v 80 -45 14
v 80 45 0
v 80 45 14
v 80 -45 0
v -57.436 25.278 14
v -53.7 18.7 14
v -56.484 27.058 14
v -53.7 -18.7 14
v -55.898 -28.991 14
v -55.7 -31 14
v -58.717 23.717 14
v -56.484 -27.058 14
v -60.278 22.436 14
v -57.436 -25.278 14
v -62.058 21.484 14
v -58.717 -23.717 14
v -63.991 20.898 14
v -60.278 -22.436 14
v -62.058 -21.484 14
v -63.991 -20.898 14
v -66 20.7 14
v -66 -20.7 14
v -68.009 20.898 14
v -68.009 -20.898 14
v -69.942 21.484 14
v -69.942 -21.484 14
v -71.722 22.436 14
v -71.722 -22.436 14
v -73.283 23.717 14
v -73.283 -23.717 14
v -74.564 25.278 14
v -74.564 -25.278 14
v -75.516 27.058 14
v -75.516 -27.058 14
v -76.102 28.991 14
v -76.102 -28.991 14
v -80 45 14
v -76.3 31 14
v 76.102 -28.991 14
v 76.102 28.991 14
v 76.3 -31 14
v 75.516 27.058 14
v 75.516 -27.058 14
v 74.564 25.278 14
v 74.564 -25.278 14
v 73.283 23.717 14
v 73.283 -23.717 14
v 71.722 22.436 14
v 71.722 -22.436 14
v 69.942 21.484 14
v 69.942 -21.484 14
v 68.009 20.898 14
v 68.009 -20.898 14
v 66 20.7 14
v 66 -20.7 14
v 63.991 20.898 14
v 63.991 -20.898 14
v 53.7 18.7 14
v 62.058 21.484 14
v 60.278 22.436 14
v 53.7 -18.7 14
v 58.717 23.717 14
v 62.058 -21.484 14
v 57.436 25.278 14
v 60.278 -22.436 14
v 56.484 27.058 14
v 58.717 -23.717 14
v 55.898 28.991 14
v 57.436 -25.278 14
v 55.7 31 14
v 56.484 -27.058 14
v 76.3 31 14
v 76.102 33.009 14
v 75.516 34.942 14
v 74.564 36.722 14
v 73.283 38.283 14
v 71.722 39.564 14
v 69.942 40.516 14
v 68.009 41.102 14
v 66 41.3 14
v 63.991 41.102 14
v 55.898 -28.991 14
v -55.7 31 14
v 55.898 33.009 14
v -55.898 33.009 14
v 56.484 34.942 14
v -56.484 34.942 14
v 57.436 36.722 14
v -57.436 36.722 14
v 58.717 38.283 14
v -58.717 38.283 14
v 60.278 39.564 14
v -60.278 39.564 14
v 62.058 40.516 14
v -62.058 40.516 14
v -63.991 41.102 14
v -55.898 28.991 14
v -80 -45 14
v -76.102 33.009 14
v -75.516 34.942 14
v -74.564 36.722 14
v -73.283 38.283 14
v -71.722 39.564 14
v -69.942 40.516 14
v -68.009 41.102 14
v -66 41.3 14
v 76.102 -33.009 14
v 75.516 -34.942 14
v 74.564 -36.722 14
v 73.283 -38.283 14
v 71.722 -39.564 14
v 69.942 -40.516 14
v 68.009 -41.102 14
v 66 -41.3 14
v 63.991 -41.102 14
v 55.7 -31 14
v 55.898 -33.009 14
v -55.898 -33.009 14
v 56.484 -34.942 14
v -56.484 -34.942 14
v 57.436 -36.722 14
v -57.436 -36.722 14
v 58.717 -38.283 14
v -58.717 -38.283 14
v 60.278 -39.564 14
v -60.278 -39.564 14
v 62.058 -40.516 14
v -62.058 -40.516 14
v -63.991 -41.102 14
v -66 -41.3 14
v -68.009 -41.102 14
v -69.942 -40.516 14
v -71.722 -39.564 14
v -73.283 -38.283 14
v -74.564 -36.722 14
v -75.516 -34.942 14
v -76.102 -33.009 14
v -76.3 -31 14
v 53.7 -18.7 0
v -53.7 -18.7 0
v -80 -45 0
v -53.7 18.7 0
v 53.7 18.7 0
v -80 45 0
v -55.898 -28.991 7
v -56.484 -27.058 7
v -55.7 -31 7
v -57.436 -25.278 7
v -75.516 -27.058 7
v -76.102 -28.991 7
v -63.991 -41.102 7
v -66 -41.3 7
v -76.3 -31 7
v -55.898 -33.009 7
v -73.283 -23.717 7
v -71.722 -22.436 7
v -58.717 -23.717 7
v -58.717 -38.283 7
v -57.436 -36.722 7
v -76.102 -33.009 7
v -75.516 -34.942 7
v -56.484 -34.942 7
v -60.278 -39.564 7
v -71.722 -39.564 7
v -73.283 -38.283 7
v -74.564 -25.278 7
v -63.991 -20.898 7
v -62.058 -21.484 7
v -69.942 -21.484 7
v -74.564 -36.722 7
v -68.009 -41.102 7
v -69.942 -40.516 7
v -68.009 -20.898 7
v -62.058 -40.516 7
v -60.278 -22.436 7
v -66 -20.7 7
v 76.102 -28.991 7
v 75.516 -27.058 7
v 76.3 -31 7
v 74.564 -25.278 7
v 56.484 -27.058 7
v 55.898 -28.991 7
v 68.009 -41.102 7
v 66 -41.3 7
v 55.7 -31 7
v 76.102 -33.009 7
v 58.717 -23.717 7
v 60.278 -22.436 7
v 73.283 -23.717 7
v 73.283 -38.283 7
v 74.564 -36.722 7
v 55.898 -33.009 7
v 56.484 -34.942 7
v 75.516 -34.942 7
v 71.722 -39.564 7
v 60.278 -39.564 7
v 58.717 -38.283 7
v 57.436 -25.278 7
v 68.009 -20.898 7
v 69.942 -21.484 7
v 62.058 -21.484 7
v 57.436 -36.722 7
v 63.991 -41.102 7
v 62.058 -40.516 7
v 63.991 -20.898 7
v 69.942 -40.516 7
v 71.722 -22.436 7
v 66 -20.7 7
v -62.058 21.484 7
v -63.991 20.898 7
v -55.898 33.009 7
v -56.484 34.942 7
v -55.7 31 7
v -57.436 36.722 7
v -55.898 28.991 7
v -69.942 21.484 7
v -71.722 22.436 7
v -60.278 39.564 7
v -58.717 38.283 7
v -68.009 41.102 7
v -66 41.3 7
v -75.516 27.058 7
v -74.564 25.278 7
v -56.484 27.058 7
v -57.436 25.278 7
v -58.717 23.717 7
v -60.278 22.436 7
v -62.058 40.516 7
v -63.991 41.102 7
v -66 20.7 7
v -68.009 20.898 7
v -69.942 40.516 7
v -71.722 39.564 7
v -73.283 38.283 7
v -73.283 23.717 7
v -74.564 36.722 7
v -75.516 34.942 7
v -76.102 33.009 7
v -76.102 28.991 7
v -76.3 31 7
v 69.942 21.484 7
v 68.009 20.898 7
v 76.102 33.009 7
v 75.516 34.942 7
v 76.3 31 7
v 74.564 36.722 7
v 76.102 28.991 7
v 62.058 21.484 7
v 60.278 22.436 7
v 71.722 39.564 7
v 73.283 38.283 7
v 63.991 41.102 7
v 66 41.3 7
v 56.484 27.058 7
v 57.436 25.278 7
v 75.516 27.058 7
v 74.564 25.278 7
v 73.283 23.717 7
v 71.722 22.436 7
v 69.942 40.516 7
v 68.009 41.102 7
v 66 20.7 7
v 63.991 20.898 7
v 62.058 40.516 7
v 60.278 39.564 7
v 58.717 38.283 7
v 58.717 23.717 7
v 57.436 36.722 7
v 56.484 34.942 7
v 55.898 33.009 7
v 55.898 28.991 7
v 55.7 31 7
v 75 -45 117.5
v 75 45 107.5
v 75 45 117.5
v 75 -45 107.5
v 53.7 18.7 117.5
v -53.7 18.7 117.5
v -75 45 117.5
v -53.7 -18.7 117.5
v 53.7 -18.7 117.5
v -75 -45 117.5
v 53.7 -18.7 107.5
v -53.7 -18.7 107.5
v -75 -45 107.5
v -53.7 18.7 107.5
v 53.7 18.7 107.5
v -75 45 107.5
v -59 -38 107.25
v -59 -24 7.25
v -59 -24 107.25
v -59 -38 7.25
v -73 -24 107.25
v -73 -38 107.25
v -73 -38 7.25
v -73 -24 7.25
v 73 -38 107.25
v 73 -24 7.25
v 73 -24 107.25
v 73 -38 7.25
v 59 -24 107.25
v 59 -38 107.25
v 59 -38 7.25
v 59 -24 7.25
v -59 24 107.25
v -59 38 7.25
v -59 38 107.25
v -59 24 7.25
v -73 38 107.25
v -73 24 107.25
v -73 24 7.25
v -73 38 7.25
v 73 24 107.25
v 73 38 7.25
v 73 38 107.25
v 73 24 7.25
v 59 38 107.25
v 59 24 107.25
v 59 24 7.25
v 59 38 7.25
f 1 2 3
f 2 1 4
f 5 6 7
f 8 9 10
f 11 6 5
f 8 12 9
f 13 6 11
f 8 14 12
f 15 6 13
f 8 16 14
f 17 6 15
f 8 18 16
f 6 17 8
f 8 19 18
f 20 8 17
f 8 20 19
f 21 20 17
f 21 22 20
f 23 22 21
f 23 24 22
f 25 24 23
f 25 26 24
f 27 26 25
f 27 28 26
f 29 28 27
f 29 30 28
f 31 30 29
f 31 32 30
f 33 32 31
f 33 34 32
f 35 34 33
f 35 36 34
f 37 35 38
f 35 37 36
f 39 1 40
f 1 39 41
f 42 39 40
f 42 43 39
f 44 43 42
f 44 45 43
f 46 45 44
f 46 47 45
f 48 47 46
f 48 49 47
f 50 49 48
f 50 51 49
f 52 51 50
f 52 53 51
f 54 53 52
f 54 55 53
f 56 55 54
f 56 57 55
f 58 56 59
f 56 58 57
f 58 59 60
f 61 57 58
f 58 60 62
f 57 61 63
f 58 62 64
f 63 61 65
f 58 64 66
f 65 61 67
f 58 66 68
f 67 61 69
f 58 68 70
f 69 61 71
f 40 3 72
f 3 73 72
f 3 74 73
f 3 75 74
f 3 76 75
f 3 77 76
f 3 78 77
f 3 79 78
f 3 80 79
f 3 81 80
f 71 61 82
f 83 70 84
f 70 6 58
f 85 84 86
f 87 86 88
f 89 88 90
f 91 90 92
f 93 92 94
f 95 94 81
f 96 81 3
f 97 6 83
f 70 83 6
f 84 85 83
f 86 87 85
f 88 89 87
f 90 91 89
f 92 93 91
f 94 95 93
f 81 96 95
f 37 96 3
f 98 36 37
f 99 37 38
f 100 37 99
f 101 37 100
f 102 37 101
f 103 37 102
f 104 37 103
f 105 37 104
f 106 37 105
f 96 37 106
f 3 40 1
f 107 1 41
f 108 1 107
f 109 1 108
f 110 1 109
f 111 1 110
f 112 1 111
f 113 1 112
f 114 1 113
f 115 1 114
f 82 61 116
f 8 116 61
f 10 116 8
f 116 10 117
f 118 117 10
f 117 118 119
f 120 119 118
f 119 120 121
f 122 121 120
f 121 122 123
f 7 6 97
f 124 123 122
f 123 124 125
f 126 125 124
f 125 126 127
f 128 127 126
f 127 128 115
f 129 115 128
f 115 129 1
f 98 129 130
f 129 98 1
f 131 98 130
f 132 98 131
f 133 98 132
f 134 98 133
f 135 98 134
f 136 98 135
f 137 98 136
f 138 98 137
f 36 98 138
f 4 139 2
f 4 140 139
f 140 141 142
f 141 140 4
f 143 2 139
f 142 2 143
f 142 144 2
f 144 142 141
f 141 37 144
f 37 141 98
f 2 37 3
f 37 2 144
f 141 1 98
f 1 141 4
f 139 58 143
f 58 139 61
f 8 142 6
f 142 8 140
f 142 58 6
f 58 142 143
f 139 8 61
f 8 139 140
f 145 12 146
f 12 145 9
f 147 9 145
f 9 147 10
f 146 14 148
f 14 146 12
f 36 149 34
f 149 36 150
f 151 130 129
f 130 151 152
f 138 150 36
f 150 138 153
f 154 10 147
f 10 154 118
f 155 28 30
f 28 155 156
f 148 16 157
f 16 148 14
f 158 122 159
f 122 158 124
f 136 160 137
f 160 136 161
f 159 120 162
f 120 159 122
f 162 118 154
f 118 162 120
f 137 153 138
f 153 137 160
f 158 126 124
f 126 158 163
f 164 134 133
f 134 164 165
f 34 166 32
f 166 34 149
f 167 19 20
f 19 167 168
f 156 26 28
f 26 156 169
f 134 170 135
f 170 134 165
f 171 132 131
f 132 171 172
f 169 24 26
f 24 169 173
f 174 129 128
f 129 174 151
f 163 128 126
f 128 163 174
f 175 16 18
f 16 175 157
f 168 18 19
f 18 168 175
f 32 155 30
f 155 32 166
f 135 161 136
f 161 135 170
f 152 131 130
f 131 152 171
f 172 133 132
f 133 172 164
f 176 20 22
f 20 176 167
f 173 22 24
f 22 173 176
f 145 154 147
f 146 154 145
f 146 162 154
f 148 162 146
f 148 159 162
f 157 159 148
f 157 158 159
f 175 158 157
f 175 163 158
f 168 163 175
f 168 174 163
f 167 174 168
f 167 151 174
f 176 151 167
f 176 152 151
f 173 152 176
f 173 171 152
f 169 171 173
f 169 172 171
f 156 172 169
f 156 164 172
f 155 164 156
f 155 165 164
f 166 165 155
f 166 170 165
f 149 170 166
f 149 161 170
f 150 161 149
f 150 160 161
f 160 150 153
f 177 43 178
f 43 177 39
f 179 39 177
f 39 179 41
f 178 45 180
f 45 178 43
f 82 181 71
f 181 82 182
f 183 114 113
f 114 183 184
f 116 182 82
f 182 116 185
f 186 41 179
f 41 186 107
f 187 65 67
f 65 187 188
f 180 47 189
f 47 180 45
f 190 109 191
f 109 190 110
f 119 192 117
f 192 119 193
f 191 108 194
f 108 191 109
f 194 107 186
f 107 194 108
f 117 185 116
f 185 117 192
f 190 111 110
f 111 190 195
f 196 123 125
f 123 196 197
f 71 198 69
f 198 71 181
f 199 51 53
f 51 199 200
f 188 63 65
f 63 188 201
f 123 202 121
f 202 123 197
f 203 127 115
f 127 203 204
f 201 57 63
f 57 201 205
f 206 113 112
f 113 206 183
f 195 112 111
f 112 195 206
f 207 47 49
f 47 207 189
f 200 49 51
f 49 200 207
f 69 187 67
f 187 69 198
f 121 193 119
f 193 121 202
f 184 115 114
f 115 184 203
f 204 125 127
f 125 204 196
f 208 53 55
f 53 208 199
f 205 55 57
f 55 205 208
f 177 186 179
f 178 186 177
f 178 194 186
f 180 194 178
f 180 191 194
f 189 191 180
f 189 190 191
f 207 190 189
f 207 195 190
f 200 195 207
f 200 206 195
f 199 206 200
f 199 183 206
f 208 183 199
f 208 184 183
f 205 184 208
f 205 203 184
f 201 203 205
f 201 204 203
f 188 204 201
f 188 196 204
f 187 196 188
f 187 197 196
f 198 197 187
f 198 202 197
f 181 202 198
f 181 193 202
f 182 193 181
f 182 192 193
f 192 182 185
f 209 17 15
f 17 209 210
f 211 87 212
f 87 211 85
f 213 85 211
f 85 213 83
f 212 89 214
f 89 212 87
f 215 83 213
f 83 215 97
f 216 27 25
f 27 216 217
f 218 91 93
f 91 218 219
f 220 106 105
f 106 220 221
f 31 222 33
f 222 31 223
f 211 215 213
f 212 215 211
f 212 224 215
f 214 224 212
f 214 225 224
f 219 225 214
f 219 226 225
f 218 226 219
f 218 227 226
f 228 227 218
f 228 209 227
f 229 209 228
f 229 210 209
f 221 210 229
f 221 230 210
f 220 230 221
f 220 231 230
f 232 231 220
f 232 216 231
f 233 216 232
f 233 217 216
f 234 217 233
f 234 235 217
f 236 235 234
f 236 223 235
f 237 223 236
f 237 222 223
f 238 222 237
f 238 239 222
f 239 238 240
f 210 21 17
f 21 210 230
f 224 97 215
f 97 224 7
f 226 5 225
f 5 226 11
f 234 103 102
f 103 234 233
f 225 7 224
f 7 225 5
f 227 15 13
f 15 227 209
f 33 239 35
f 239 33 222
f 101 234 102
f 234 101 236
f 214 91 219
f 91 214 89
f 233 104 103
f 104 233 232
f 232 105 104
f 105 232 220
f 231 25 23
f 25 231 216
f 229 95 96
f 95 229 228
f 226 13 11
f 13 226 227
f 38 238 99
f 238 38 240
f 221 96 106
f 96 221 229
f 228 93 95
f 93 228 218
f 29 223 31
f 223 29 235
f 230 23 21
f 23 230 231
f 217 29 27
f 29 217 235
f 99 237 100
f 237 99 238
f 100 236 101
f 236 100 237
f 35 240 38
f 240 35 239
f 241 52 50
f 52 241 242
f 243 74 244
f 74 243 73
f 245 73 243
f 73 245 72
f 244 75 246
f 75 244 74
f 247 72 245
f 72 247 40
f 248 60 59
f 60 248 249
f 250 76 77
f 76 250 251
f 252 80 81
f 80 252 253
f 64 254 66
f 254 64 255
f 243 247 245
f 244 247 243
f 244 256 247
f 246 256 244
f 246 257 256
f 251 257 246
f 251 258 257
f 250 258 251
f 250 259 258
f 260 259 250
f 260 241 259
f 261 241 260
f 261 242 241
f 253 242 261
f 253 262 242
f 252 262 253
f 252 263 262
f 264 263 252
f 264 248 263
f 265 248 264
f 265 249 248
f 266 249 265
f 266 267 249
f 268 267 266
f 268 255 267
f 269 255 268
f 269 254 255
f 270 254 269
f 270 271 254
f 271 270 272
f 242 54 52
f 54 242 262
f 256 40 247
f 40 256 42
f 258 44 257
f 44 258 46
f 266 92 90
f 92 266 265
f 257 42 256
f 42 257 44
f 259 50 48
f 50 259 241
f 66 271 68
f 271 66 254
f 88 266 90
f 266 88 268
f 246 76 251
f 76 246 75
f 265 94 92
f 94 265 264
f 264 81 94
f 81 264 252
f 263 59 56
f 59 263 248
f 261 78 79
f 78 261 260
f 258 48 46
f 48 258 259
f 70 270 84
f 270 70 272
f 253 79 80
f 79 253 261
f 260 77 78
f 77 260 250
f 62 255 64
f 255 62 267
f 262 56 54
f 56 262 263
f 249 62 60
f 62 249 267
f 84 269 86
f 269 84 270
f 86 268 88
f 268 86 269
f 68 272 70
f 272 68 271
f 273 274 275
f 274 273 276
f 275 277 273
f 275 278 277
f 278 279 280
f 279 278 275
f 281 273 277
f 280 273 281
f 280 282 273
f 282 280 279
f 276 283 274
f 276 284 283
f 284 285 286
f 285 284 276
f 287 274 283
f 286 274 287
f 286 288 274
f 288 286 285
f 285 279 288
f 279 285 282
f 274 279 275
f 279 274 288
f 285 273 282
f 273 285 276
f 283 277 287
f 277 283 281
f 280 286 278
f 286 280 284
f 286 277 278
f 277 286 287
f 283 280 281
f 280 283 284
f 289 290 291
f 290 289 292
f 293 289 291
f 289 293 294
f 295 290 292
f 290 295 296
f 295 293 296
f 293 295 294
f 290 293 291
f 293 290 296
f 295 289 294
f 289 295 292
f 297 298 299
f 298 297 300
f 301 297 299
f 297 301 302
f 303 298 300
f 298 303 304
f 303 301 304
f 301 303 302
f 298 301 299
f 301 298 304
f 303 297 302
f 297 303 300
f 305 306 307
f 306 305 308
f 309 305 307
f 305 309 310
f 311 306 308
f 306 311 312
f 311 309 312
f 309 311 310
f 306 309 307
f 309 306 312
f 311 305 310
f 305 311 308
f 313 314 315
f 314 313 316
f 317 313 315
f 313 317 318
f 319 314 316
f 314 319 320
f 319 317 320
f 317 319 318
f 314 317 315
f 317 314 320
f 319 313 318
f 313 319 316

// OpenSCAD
$fn = 32;

// ------------------------------------------------------------------------
// Frame cube: base 160 x 90 mm, posts 100 mm tall
// Every part is its own module, assembly() places every instance.
// ------------------------------------------------------------------------

// --- part 1 ---
module base_frame() {
  difference() {
    translate([-80, -45, 0]) cube([160, 90, 14]);
    translate([-53.7, -18.7, -1]) cube([107.4, 37.4, 16]);
    translate([-66, -31, 7]) cylinder(h = 8, d = 20.6);
    translate([66, -31, 7]) cylinder(h = 8, d = 20.6);
    translate([-66, 31, 7]) cylinder(h = 8, d = 20.6);
    translate([66, 31, 7]) cylinder(h = 8, d = 20.6);
  }
}

// --- part 2 ---
module corner_post() {
  translate([-7, -7, 0]) cube([14, 14, 100]);
}

// --- part 3 ---
module top_frame() {
  difference() {
    translate([-75, -45, 0]) cube([150, 90, 10]);
    translate([-53.7, -18.7, -1]) cube([107.4, 37.4, 12]);
  }
}

// --- assembly ---
module assembly() {
  color([0.80, 0.24, 0.20]) translate([0, 0, 0]) rotate([0, 0, 0]) base_frame();
  color([0.20, 0.45, 0.75]) translate([-66, -31, 7.25]) rotate([0, 0, 0]) corner_post();
  color([0.25, 0.62, 0.32]) translate([66, -31, 7.25]) rotate([0, 0, 0]) corner_post();
  color([0.92, 0.70, 0.18]) translate([-66, 31, 7.25]) rotate([0, 0, 0]) corner_post();
  color([0.58, 0.35, 0.70]) translate([66, 31, 7.25]) rotate([0, 0, 0]) corner_post();
  color([0.16, 0.66, 0.66]) translate([0, 0, 107.5]) rotate([0, 0, 0]) top_frame();
}

assembly();
